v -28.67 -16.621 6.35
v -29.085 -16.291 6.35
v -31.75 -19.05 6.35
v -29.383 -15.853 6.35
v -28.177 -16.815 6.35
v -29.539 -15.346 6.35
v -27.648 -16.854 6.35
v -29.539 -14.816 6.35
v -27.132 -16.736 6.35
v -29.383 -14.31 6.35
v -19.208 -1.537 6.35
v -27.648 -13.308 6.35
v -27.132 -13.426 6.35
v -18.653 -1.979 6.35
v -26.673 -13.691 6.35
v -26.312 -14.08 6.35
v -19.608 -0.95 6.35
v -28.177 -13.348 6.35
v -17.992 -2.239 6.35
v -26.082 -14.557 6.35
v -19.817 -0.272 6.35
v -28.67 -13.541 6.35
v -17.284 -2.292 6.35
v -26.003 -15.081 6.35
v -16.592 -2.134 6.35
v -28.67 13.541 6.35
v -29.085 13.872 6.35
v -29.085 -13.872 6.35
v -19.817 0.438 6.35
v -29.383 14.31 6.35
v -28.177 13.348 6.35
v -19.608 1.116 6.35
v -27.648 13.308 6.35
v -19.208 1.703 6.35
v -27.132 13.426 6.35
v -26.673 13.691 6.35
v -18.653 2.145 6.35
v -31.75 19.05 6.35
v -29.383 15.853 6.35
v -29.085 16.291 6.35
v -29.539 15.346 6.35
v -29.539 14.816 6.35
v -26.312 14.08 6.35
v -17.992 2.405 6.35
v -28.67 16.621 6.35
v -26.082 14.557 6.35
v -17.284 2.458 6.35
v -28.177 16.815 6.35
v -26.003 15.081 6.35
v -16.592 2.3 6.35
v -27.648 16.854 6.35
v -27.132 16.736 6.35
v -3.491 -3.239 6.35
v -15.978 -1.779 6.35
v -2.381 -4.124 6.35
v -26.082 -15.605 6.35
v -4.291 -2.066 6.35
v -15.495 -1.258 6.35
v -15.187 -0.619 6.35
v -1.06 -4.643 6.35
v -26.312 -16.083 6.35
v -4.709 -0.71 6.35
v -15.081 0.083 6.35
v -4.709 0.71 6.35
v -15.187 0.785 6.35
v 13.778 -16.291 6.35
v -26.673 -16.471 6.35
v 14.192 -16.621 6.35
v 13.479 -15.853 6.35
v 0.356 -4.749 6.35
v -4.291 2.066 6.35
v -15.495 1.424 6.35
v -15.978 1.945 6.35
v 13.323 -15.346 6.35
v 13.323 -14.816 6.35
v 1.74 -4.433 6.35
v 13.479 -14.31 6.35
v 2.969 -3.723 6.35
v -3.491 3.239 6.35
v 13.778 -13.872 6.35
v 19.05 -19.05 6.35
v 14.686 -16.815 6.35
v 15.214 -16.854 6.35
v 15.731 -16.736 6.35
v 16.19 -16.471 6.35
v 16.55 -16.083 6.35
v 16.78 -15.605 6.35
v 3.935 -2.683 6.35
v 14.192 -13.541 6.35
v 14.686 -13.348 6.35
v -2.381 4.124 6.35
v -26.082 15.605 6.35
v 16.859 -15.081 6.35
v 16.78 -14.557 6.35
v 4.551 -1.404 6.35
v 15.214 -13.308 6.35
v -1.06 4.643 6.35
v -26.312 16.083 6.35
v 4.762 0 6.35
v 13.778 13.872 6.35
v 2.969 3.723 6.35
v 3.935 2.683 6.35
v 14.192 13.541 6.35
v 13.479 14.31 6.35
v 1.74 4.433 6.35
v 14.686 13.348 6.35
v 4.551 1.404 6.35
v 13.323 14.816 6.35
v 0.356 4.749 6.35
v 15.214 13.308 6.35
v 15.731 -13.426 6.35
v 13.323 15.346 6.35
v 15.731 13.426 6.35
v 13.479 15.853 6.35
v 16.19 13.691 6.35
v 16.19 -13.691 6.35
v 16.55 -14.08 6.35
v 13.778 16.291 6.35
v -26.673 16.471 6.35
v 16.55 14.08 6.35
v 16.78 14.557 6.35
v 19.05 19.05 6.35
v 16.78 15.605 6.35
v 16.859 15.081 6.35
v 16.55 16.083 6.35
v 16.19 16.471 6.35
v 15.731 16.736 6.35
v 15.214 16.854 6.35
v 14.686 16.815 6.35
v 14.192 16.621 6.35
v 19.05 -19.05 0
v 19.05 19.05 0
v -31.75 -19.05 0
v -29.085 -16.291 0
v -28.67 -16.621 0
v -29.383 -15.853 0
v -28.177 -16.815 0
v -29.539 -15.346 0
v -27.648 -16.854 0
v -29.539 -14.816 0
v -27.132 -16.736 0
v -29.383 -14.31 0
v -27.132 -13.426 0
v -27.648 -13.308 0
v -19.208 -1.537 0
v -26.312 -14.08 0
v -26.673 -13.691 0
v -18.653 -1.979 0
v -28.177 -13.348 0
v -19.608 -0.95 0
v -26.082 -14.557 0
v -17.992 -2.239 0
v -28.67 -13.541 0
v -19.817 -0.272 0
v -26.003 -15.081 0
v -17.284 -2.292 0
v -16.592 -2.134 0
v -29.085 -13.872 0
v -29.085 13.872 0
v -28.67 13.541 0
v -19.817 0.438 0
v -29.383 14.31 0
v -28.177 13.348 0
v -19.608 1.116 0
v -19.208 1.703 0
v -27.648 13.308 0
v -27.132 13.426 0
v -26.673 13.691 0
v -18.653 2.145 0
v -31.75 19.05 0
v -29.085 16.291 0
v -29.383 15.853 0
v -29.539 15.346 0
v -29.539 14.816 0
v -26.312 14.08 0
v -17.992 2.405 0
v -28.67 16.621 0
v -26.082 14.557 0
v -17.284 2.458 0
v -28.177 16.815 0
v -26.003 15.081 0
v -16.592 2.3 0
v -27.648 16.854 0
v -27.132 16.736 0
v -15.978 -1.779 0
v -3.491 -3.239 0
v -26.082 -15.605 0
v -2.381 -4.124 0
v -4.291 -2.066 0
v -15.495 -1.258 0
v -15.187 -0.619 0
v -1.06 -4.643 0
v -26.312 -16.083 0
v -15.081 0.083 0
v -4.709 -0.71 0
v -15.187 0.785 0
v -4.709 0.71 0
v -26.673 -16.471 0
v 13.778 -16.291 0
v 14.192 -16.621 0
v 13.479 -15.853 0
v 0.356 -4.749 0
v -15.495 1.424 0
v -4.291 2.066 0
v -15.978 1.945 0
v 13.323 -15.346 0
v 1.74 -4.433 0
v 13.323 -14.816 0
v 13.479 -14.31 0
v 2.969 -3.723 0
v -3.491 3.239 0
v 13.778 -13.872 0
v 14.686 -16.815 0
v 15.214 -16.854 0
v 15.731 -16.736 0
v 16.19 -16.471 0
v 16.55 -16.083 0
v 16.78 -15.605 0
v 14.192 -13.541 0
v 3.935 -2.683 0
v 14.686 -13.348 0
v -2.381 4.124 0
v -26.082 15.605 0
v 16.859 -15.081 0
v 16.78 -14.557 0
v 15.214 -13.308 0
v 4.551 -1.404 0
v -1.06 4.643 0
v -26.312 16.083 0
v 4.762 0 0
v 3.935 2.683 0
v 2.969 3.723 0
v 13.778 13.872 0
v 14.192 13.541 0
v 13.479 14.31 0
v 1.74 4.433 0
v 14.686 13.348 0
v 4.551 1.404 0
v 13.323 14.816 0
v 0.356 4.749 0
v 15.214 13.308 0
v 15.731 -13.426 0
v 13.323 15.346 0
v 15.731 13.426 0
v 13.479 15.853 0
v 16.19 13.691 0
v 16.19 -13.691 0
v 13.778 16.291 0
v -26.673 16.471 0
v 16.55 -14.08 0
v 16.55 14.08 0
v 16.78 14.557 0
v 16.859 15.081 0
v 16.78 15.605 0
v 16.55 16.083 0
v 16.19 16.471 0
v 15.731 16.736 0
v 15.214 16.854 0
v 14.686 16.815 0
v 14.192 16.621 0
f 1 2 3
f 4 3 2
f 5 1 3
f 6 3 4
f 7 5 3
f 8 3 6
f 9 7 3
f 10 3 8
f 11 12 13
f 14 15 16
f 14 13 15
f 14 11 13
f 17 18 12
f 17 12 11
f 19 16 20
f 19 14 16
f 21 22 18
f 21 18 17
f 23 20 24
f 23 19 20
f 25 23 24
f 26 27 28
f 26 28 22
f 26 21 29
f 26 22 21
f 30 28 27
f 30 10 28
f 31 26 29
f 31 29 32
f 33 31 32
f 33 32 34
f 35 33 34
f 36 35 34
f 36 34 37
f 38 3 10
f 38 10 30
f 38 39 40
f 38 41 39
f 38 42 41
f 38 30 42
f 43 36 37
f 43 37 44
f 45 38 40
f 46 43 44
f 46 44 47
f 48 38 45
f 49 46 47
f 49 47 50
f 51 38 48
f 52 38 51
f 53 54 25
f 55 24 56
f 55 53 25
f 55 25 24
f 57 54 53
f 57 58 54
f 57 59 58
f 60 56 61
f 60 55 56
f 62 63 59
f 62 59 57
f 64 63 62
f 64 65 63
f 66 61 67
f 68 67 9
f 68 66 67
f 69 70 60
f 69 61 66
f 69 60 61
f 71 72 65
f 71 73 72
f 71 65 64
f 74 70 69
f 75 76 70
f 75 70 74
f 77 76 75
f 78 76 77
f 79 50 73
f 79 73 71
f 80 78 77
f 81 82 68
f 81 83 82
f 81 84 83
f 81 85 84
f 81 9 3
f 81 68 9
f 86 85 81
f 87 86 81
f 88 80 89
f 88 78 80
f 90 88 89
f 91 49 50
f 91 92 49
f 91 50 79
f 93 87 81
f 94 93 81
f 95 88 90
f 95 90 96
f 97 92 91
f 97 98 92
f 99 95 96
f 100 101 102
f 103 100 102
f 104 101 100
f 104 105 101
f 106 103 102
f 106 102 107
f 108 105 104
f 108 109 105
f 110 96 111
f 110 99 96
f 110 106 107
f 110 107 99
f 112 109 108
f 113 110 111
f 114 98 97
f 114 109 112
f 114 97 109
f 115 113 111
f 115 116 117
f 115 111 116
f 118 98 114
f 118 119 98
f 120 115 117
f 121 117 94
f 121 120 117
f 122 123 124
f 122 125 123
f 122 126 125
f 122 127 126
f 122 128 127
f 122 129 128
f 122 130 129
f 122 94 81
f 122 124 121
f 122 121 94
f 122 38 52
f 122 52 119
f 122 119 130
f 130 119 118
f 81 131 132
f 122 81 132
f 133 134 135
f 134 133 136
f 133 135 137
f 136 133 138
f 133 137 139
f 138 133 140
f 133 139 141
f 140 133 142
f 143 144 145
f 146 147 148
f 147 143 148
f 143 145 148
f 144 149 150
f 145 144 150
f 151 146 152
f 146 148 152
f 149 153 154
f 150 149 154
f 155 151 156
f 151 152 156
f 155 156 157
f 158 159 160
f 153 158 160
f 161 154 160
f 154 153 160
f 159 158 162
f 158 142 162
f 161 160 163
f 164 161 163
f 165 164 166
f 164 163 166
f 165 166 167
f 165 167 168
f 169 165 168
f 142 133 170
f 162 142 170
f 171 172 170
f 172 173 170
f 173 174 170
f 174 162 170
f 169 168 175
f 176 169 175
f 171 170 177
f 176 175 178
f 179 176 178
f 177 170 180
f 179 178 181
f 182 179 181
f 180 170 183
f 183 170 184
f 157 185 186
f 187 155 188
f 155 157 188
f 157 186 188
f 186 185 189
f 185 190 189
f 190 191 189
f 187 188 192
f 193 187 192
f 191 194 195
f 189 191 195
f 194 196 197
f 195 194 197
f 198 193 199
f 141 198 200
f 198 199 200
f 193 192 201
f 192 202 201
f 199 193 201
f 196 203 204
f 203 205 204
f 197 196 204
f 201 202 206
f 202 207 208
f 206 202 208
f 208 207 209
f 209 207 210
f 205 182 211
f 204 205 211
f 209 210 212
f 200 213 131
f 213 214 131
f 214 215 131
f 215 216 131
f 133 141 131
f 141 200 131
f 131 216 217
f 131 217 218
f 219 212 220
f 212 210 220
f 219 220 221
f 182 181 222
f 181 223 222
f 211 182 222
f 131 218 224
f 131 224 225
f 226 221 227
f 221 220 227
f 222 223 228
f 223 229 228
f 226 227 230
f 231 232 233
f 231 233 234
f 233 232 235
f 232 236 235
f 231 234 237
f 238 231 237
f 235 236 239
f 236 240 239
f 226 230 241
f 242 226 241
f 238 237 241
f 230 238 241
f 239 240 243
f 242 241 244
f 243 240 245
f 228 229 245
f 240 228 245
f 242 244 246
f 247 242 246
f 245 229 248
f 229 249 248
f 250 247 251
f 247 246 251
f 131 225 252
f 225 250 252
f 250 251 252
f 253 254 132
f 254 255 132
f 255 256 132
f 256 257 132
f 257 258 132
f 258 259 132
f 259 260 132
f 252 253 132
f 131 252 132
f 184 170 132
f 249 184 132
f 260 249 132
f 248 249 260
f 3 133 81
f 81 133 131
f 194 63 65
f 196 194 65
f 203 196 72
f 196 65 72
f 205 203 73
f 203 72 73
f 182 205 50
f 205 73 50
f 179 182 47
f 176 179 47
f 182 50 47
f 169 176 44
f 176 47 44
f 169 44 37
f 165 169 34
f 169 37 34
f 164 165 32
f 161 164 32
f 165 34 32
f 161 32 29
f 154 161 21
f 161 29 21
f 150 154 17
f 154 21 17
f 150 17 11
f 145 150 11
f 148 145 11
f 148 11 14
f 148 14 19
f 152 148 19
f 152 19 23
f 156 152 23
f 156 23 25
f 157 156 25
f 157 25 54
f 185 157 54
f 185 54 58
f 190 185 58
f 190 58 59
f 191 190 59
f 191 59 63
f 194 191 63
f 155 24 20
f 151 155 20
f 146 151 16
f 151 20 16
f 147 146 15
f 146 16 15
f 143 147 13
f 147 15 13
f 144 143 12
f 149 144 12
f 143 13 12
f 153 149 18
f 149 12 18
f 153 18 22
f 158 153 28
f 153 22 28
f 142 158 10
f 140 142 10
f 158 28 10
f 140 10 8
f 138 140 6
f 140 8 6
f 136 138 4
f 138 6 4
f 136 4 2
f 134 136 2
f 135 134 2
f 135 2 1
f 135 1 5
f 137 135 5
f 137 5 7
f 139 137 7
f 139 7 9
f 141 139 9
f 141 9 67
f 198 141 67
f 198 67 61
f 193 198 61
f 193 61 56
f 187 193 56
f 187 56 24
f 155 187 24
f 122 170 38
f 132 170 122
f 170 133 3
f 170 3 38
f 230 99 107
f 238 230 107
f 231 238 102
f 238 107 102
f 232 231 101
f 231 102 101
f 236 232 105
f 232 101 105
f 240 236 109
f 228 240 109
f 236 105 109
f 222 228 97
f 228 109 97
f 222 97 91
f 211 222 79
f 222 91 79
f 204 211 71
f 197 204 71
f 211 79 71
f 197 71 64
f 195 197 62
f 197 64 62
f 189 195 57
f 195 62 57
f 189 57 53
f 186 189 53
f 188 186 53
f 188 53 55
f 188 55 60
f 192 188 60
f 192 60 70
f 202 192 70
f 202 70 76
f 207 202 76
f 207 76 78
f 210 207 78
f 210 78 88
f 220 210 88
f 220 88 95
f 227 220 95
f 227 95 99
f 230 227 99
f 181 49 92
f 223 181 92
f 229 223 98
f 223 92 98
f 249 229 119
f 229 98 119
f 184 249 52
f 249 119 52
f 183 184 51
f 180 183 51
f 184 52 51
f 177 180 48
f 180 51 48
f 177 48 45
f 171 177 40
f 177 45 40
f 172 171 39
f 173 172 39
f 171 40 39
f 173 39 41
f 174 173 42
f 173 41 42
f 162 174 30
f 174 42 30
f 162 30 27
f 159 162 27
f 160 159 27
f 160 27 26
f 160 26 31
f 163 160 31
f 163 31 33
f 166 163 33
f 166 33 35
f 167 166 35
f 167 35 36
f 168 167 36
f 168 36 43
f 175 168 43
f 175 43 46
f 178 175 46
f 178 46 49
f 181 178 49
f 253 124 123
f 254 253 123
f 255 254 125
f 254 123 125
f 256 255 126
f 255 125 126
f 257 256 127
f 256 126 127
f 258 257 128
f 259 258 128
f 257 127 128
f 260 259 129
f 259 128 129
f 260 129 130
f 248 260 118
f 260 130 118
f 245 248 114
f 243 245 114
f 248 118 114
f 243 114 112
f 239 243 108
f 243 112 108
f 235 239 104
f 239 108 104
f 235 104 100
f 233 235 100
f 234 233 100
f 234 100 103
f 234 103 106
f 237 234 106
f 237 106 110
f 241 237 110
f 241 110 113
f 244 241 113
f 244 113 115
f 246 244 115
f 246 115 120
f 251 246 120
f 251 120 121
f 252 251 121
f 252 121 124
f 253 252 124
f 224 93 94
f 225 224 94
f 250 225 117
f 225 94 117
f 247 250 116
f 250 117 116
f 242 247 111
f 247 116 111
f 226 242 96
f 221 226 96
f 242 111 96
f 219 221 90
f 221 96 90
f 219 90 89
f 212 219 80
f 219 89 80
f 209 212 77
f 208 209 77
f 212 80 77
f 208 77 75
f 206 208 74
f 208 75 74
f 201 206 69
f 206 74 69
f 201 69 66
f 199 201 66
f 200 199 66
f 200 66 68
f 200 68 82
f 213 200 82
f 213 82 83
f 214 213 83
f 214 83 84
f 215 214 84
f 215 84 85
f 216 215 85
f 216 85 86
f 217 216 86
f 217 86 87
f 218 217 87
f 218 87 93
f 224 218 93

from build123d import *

# Parameters (mm, degrees)
SKETCH1_W           = 50.8
SKETCH1_H           = 38.1
BOSS_EXTRUDE1_DEPTH = 6.35
SKETCH2_R           = 2.38125
SKETCH2_R_2         = 4.7625
CUT_EXTRUDE1_DEPTH  = 38.567106623
SKETCH3_R           = 1.778
CUT_EXTRUDE2_DEPTH  = 38.567106623


with BuildPart() as part:
    # Sketch1 → Boss-Extrude1 (new body)
    with BuildSketch(Plane.XY):
        with Locations((-6.35, 0)):
            Rectangle(SKETCH1_W, SKETCH1_H)
    extrude(amount=BOSS_EXTRUDE1_DEPTH)

    # Sketch2 → Cut-Extrude1 (cut, through all)
    with BuildSketch(Plane.XY.offset(6.35)):
        with Locations((-17.462302917, 0.082964446)):
            Circle(SKETCH2_R)
        Circle(SKETCH2_R_2)
    extrude(amount=-CUT_EXTRUDE1_DEPTH, mode=Mode.SUBTRACT)

    # Sketch3 → Cut-Extrude2 (cut, through all)
    with BuildSketch(Plane.XY.offset(6.35)):
        with Locations((-27.78125, 15.08125)):
            Circle(SKETCH3_R)
        with Locations((15.08125, 15.08125)):
            Circle(SKETCH3_R)
        with Locations((15.08125, -15.08125)):
            Circle(SKETCH3_R)
        with Locations((-27.78125, -15.08125)):
            Circle(SKETCH3_R)
    extrude(amount=-CUT_EXTRUDE2_DEPTH, mode=Mode.SUBTRACT)


solid = part.part
